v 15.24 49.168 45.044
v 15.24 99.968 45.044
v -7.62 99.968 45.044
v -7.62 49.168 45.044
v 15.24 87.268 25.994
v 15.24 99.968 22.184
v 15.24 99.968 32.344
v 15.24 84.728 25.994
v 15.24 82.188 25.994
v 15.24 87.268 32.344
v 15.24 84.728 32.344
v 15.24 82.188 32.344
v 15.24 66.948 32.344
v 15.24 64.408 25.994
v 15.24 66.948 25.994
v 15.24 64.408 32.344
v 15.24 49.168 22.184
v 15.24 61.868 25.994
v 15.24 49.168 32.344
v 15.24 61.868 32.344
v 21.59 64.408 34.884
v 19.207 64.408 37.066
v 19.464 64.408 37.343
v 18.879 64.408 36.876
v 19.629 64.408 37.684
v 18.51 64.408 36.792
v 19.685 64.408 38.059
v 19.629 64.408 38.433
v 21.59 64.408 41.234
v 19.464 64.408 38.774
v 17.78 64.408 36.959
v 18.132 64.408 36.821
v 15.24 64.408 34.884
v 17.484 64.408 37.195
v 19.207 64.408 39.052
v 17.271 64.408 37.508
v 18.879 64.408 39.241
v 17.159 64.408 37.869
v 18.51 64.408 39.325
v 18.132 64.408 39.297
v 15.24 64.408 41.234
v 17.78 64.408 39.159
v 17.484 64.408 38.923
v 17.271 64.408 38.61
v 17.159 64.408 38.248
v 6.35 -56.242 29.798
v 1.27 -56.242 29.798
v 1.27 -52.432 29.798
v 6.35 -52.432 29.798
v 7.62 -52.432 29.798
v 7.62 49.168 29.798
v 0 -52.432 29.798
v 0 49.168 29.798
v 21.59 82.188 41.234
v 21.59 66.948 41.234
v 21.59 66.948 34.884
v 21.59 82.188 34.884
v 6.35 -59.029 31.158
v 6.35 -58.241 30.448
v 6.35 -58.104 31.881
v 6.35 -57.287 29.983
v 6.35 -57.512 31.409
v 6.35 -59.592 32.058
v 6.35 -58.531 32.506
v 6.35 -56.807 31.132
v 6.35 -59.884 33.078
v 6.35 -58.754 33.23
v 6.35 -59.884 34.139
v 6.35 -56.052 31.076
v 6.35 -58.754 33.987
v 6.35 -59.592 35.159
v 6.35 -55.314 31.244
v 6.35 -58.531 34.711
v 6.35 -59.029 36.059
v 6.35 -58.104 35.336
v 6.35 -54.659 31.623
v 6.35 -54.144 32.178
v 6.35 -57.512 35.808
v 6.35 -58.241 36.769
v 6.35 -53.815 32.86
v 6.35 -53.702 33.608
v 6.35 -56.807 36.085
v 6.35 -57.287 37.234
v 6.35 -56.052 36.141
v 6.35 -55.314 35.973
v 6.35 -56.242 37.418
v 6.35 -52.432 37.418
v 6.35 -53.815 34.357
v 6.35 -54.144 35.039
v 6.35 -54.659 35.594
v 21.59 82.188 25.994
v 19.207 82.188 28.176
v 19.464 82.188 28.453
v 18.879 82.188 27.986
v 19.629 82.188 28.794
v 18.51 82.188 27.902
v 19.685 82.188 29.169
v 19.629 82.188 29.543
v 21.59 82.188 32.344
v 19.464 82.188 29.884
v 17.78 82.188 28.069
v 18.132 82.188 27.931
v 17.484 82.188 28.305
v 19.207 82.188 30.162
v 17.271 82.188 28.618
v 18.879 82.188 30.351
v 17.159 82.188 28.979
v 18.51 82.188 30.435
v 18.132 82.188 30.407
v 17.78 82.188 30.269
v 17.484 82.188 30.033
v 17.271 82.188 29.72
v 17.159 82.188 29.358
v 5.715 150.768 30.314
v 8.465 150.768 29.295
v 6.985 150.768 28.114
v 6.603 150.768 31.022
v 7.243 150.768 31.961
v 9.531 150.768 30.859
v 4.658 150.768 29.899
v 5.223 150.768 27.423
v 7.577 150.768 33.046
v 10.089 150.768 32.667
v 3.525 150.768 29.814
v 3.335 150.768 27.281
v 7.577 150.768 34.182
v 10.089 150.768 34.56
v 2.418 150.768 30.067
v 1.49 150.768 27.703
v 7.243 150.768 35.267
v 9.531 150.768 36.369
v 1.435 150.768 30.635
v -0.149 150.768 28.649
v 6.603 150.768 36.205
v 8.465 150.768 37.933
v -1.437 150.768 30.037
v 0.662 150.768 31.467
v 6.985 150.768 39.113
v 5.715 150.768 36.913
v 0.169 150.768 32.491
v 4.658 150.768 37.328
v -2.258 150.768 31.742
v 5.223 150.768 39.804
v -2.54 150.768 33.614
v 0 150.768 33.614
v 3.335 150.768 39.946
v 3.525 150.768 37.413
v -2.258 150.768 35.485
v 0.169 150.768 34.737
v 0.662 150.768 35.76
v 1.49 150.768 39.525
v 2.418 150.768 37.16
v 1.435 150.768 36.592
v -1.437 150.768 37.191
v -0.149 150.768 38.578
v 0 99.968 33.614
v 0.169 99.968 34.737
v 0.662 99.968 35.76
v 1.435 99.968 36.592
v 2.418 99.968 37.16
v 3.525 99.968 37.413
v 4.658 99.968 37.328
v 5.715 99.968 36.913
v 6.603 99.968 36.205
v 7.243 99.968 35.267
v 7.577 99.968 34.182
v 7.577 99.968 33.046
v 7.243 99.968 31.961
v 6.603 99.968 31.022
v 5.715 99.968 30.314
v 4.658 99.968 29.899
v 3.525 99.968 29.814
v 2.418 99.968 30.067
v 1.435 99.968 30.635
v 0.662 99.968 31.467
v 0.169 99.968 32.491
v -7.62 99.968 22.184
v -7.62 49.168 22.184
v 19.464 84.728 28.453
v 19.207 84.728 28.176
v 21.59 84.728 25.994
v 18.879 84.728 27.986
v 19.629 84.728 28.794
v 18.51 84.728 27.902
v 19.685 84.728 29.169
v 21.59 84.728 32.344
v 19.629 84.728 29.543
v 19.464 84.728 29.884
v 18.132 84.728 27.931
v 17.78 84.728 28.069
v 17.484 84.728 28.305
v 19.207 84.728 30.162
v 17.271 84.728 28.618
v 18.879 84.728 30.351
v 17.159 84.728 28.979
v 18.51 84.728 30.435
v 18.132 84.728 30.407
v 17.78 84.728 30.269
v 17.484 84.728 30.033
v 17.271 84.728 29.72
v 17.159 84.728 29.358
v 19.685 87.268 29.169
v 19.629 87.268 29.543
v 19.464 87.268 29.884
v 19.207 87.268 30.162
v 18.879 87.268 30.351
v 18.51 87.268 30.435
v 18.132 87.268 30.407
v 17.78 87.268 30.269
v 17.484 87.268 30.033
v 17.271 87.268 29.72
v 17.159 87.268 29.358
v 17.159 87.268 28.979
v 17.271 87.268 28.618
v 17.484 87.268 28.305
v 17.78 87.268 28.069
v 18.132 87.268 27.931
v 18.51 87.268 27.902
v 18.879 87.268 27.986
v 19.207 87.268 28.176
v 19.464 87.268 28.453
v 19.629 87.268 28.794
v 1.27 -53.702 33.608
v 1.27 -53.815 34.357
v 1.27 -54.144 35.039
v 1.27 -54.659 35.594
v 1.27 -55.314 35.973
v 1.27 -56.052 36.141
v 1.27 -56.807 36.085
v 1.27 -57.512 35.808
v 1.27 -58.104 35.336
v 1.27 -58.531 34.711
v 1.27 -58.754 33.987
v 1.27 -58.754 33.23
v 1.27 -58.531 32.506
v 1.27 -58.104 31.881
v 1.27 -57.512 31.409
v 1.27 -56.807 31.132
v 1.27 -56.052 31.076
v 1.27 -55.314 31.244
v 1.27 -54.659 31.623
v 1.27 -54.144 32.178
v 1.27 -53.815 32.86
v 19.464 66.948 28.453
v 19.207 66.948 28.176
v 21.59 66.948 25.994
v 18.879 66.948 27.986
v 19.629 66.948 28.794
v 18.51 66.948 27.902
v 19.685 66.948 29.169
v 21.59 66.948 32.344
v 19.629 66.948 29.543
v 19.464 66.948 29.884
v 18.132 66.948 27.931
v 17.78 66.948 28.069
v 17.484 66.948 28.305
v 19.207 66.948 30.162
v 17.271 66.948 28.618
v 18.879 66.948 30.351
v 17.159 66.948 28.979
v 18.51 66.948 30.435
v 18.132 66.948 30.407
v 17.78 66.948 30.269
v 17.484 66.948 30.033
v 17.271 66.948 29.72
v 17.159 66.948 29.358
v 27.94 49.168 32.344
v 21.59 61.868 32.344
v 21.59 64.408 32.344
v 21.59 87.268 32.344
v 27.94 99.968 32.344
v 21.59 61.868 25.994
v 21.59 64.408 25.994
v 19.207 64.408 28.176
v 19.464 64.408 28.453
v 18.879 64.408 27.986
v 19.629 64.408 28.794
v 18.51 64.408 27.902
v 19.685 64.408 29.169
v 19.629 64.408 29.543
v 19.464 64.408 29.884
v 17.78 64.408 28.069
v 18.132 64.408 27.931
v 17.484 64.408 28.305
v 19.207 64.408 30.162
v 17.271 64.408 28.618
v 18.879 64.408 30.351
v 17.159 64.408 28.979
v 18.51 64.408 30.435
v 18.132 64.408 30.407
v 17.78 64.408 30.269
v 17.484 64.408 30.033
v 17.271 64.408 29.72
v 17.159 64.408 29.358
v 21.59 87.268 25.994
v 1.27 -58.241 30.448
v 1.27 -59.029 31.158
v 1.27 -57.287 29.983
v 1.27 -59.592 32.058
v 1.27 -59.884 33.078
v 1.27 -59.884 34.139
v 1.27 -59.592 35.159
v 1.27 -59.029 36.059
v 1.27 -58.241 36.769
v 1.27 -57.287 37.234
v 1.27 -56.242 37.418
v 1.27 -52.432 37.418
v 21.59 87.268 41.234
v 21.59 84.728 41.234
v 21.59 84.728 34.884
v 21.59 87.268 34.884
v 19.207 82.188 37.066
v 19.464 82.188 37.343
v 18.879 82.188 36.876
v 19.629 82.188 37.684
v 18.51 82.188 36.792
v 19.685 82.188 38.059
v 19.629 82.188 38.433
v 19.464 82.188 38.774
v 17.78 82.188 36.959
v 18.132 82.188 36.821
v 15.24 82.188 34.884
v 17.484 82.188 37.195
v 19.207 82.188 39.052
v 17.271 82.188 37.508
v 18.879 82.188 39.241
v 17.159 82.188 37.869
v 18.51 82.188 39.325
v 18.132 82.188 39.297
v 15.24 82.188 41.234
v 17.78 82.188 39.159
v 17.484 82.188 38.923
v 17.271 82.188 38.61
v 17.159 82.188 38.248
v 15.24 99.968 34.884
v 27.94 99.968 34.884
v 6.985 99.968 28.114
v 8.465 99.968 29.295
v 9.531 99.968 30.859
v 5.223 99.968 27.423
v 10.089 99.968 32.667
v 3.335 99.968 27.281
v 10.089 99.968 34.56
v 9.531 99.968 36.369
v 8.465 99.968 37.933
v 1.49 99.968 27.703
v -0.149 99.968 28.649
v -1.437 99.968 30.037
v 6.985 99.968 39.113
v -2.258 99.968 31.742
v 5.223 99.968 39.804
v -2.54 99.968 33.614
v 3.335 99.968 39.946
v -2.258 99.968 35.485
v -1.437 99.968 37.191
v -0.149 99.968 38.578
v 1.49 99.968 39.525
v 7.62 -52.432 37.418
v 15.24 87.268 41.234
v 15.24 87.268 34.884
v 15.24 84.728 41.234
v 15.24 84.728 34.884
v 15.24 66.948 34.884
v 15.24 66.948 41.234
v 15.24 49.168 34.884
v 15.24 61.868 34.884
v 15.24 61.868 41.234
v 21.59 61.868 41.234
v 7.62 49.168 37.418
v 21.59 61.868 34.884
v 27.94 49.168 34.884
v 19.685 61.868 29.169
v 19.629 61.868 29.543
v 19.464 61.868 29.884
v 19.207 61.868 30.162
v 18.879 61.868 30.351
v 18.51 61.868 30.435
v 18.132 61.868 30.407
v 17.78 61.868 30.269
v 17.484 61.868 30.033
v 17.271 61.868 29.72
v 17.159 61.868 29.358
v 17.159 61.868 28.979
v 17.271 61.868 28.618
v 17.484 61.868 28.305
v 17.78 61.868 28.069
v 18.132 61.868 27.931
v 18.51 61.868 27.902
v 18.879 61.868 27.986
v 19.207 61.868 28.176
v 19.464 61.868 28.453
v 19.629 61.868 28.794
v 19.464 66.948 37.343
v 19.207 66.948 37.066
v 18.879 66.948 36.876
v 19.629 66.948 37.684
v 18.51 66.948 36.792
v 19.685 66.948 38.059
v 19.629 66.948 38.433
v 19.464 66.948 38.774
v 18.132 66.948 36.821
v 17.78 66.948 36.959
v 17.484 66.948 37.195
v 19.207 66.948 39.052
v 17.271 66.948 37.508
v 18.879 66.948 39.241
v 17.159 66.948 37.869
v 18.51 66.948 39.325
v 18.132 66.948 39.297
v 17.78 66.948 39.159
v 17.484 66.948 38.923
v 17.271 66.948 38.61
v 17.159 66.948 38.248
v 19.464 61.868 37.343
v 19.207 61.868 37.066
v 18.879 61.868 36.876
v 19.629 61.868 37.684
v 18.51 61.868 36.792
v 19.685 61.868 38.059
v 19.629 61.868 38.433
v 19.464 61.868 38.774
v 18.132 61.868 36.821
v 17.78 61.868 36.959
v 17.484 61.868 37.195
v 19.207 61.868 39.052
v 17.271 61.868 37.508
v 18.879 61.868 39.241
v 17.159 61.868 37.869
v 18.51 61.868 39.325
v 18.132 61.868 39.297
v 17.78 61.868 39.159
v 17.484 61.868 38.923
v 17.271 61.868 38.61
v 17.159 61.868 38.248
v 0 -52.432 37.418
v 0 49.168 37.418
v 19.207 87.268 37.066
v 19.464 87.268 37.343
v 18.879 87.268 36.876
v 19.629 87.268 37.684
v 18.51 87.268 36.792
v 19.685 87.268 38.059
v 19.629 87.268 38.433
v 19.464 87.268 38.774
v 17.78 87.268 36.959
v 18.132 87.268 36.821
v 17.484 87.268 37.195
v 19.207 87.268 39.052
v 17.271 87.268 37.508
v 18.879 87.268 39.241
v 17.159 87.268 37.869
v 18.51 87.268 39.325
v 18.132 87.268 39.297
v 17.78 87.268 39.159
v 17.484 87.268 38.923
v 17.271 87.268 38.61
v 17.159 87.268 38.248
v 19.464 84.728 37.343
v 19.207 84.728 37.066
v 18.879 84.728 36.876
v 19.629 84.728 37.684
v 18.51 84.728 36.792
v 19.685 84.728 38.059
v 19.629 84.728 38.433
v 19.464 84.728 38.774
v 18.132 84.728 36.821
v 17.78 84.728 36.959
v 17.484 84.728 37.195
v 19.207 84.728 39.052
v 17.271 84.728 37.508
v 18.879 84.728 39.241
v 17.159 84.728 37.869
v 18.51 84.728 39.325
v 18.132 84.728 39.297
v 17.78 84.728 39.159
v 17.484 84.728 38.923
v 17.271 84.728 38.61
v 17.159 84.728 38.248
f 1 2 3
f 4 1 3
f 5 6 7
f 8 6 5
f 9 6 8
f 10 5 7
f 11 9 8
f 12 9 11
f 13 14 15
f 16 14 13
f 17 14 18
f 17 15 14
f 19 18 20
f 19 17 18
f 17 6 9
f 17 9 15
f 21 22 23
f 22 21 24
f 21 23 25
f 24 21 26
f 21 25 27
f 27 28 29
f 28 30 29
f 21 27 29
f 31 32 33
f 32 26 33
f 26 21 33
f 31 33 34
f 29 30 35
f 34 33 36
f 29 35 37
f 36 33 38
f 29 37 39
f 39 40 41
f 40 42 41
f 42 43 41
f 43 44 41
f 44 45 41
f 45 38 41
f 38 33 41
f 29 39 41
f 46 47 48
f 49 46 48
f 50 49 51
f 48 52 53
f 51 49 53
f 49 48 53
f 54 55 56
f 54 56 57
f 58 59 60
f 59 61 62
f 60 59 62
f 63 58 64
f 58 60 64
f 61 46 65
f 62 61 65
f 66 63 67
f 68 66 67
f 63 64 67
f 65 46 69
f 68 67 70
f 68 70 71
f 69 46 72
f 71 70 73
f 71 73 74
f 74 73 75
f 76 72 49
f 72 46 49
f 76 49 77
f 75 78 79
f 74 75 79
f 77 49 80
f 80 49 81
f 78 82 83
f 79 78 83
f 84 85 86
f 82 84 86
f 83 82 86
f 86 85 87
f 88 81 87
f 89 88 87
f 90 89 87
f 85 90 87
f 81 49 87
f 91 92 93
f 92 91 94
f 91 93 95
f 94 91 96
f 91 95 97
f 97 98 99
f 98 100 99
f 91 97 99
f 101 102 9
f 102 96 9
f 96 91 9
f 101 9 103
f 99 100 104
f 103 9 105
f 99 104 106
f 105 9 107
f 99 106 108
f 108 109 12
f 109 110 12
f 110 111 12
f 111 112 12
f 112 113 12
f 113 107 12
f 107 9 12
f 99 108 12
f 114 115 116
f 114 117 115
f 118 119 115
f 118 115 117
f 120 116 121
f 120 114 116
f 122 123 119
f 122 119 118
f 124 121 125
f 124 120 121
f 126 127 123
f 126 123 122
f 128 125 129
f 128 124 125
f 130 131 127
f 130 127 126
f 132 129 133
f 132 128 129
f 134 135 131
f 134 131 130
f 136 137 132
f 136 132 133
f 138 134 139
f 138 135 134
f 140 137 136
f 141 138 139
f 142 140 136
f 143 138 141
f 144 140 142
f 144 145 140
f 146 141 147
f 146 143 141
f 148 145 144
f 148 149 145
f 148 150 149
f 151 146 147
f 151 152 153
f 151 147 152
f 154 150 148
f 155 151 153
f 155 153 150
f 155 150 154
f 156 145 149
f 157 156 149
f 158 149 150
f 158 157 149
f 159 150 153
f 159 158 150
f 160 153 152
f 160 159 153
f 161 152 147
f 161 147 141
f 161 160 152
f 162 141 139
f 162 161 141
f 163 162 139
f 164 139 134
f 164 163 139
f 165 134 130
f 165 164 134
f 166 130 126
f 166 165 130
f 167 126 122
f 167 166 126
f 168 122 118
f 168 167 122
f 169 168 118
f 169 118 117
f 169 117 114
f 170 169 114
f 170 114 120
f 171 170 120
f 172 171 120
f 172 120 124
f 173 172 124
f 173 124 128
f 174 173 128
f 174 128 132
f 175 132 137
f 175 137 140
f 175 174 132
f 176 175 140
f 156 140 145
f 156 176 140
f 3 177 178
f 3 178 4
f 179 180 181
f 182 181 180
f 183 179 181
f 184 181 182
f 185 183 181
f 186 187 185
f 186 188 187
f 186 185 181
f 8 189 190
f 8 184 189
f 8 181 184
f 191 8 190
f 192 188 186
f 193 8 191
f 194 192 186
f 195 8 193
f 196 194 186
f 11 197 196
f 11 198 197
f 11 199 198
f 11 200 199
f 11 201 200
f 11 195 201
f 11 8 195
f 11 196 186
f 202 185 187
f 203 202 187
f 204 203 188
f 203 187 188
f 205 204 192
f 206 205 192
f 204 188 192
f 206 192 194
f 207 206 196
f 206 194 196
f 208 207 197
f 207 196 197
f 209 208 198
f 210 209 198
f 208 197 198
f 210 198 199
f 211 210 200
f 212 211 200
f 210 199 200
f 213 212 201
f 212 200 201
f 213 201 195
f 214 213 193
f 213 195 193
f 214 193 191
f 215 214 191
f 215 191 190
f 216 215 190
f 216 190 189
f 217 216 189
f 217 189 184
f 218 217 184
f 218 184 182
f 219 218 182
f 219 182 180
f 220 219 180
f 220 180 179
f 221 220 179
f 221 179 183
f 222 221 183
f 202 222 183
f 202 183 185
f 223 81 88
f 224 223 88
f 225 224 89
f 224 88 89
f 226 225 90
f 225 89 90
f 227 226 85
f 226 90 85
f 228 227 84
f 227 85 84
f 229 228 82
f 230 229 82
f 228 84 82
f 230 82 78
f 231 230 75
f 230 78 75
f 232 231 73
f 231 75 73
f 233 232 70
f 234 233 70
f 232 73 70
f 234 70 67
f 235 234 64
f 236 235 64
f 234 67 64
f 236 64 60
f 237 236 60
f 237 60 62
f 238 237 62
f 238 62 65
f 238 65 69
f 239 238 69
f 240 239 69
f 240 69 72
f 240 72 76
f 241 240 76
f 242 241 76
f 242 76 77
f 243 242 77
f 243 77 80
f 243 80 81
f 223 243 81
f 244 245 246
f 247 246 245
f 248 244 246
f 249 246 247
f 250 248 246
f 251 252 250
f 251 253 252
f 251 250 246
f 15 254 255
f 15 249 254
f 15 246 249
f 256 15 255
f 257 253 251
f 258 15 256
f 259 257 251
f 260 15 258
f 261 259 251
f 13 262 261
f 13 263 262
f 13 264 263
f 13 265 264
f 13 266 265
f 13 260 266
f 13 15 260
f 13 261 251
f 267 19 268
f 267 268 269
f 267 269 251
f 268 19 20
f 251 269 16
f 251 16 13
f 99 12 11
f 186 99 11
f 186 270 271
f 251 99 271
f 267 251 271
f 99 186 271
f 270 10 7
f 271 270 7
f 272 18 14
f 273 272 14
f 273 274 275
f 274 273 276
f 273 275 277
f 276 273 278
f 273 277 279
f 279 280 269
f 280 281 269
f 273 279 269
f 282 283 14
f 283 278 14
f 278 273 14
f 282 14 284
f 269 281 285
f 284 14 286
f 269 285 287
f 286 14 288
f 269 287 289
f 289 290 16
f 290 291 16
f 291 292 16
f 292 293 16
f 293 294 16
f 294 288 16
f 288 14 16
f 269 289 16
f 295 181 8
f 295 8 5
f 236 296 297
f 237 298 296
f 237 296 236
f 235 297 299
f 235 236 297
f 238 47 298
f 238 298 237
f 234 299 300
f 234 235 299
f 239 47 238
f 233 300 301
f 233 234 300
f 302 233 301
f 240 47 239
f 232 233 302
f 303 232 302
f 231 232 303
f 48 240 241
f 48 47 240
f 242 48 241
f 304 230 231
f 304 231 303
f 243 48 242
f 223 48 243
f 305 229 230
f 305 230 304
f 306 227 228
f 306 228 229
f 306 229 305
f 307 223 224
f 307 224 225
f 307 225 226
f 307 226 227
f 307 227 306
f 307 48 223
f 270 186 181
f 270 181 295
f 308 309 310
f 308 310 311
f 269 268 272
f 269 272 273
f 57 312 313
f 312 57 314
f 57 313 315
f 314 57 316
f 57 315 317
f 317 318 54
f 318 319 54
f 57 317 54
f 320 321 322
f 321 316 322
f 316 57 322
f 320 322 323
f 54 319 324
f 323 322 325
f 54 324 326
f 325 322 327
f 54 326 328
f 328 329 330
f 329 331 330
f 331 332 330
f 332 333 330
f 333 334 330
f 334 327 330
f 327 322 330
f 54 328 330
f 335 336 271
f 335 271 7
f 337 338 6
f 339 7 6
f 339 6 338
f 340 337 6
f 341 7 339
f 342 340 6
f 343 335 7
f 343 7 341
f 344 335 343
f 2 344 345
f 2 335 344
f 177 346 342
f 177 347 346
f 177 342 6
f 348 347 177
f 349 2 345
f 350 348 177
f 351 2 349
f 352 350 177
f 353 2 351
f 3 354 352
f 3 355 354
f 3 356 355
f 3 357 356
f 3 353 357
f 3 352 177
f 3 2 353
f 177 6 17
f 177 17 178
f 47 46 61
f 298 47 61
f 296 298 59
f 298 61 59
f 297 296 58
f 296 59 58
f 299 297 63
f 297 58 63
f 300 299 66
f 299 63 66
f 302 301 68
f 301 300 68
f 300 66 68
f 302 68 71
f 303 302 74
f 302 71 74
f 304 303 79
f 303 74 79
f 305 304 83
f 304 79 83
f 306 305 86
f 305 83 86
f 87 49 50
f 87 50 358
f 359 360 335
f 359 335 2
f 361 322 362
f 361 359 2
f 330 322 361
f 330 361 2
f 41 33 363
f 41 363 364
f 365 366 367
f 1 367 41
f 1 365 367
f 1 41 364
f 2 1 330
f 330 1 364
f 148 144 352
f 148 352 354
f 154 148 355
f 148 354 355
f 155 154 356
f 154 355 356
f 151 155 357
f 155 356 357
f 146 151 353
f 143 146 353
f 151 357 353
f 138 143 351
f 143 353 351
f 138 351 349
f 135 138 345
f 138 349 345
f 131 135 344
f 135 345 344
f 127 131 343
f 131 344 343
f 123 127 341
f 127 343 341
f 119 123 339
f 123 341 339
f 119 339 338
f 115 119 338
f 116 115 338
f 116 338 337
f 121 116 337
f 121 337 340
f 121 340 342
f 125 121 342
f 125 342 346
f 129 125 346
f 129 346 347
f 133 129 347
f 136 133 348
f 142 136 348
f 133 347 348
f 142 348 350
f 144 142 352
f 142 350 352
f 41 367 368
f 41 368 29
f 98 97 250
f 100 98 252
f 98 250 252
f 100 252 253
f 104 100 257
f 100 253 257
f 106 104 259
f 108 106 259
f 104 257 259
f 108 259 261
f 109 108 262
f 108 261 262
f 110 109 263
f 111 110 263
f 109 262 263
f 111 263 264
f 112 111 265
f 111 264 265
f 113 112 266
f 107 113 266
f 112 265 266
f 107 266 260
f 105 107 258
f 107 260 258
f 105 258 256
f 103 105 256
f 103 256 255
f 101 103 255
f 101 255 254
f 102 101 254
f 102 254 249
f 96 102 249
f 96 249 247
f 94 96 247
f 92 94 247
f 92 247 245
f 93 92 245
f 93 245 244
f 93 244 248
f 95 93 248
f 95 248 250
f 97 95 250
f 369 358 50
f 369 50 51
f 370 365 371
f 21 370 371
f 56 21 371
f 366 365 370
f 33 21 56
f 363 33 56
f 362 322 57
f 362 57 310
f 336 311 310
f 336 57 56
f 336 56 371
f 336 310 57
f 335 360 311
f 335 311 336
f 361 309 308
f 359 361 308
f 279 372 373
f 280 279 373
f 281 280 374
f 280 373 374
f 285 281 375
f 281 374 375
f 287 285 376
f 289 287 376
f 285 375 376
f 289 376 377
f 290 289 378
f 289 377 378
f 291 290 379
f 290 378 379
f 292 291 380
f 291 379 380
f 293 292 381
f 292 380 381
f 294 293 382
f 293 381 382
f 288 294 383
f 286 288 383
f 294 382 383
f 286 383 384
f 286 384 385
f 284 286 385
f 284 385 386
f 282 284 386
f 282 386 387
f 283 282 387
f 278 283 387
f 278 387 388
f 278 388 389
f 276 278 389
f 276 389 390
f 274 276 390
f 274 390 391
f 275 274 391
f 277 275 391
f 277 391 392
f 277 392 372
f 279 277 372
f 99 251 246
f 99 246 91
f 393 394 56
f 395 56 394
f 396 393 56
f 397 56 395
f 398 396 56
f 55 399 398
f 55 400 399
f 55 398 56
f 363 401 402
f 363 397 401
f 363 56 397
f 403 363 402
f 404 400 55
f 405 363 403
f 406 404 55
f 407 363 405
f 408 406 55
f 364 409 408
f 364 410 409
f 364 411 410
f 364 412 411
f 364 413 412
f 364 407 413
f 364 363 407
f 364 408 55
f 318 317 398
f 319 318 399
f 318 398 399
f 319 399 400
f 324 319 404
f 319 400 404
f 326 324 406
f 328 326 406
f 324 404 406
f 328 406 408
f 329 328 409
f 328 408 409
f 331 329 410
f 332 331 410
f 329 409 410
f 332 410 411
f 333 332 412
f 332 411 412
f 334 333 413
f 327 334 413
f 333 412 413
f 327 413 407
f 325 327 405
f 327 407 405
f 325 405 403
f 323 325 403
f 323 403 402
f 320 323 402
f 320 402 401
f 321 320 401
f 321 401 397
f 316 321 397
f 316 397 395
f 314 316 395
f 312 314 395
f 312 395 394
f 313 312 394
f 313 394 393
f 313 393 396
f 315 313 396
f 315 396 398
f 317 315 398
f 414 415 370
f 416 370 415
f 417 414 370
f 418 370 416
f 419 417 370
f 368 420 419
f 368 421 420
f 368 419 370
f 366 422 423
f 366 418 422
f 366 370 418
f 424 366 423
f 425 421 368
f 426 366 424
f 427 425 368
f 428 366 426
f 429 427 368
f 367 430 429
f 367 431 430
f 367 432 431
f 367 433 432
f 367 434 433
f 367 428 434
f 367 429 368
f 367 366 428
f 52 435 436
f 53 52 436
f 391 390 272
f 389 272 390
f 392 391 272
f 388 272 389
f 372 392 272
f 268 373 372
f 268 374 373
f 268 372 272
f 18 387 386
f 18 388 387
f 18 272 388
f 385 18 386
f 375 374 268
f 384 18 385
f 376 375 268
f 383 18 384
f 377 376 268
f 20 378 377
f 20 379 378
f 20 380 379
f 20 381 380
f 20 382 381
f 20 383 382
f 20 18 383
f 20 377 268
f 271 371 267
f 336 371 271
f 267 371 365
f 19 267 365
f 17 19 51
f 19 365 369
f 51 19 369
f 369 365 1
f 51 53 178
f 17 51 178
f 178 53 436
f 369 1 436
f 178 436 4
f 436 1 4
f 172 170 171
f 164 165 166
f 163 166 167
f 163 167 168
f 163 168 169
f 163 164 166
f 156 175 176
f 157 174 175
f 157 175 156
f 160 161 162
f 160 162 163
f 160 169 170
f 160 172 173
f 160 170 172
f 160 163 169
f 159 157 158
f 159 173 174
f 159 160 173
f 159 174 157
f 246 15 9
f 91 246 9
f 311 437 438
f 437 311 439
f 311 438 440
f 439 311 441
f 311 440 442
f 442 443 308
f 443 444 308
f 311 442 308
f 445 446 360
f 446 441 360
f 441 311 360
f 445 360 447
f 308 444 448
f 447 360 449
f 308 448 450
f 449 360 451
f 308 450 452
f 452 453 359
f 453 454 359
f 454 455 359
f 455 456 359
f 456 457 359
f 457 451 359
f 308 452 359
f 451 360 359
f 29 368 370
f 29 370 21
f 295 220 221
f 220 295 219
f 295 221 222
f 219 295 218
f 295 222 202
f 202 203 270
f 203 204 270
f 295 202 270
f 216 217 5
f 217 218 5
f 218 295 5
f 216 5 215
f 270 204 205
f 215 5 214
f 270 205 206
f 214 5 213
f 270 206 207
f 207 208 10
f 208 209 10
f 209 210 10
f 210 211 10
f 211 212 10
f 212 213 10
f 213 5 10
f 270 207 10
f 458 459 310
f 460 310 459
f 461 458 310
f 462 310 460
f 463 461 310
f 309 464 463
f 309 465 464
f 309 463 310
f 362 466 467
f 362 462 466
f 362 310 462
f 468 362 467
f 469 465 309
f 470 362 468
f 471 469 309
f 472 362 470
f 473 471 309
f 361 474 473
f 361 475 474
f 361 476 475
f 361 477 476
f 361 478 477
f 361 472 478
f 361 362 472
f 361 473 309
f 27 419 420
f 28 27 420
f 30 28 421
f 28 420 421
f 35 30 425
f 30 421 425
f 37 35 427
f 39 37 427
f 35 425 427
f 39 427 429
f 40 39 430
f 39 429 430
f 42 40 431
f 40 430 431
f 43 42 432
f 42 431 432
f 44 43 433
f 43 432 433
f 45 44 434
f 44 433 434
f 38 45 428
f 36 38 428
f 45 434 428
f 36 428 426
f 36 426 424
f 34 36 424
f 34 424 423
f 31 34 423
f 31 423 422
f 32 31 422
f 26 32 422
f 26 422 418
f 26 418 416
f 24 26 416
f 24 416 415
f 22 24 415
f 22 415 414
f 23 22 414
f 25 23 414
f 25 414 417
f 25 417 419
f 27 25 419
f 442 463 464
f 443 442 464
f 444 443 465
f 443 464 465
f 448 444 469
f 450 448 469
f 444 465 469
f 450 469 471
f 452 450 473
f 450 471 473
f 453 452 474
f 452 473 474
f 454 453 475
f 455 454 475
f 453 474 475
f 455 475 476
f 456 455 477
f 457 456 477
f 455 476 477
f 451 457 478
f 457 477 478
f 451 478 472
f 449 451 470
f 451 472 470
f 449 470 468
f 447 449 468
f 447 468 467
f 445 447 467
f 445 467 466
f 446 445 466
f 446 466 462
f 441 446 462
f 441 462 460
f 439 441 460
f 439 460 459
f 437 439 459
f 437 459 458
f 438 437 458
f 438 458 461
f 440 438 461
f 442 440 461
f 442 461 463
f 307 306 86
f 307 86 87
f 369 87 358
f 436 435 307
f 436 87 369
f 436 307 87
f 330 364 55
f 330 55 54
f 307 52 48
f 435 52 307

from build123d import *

# Parameters (mm, degrees)
F0_W      = 101.6
F0_H      = 7.62
F1_DEPTH  = 7.62
F2_W      = 5.08
F2_H      = 7.62
F3_DEPTH  = 7.62
F4_R      = 2.54
F5_DEPTH  = 25.4
F6_W      = 22.86
F6_H      = 22.86
F6_W_2    = 7.62
F6_H_2    = 7.62
F7_DEPTH  = 50.8
F8_R      = 6.35
F8_R_2    = 3.81
F9_DEPTH  = 50.8
F10_W     = 50.8
F10_H     = 2.54
F11_DEPTH = 12.7
F12_W     = 2.54
F12_H     = 6.35
F12_W_2   = 15.24
F13_DEPTH = 6.35
F14_W     = 2.54
F14_H     = 6.35
F14_W_2   = 15.24
F15_DEPTH = 6.35
F16_R     = 1.27
F17_DEPTH = 25.4
F18_R     = 1.27
F19_DEPTH = 25.4


with BuildPart() as f1:
    # F0 (on Right) → F1 (new body)
    with BuildSketch(Plane.YZ):
        with Locations((-1.6321643911, 33.6084578316)):
            Rectangle(F0_W, F0_H)
    extrude(amount=F1_DEPTH)

    # F2 (on face) → F3 (join)
    with BuildSketch(Plane.XZ.offset(52.4321643911)):
        with Locations((3.81, 33.6084578316)):
            Rectangle(F2_W, F2_H)
    extrude(amount=F3_DEPTH)

    # F4 (on face) → F5 (cut)
    with BuildSketch(Plane.YZ.offset(6.35)):
        with Locations((-56.2421643911, 33.6084578316)):
            Circle(F4_R)
        with BuildLine():
            ThreePointArc((-56.2421643911, 29.7984578316), (-59.9211503168, 33.6084578316), (-56.2421643911, 37.4184578316))
            Line((-56.2421643911, 37.4184578316), (-60.0521643911, 37.4184578316))
            Line((-60.0521643911, 37.4184578316), (-60.0521643911, 29.7984578316))
            Line((-60.0521643911, 29.7984578316), (-56.2421643911, 29.7984578316))
        make_face()
    extrude(amount=-F5_DEPTH, mode=Mode.SUBTRACT)

    # F6 (on face) → F7 (join)
    with BuildSketch(Plane(origin=(0, 49.1678356089, 0), x_dir=(-1, 0, 0), z_dir=(0, 1, 0))):
        with Locations((-3.81, 33.6136929691)):
            Rectangle(F6_W, F6_H)
        with Locations((-3.81, 33.6084578316)):
            Rectangle(F6_W_2, F6_H_2, mode=Mode.SUBTRACT)
        with Locations((-3.81, 33.6084578316)):
            Rectangle(F6_W_2, F6_H_2)
    extrude(amount=F7_DEPTH)

    # F8 (on face) → F9 (join)
    with BuildSketch(Plane(origin=(0, 99.9678356089, 0), x_dir=(-1, 0, 0), z_dir=(0, 1, 0))):
        with Locations((-3.81, 33.6136929691)):
            Circle(F8_R)
        with Locations((-3.81, 33.6136929691)):
            Circle(F8_R_2, mode=Mode.SUBTRACT)
    extrude(amount=F9_DEPTH)

    # F10 (on face) → F11 (join)
    with BuildSketch(Plane.YZ.offset(15.24)):
        with Locations((74.5678356089, 33.6136929691)):
            Rectangle(F10_W, F10_H)
    extrude(amount=F11_DEPTH)

    # F12 (on face) → F13 (join)
    with BuildSketch(Plane.YZ.offset(15.24)):
        with Locations((63.1378356089, 38.0586929691)):
            Rectangle(F12_W, F12_H)
        with Locations((74.5678356089, 38.0586929691)):
            Rectangle(F12_W_2, F12_H)
        with Locations((85.9978356089, 38.0586929691)):
            Rectangle(F12_W, F12_H)
    extrude(amount=F13_DEPTH)

    # F14 (on face) → F15 (join)
    with BuildSketch(Plane.YZ.offset(15.24)):
        with Locations((63.1378356089, 29.1686929691)):
            Rectangle(F14_W, F14_H)
        with Locations((74.5678356089, 29.1686929691)):
            Rectangle(F14_W_2, F14_H)
        with Locations((85.9978356089, 29.1686929691)):
            Rectangle(F14_W, F14_H)
    extrude(amount=F15_DEPTH)

    # F16 (on face) → F17 (cut)
    with BuildSketch(Plane.XZ.offset(-61.8678356089)):
        with Locations((18.415, 38.0586929691)):
            Circle(F16_R)
    extrude(amount=-F17_DEPTH, mode=Mode.SUBTRACT)

    # F18 (on face) → F19 (cut)
    with BuildSketch(Plane.XZ.offset(-61.8678356089)):
        with Locations((18.415, 29.1686929691)):
            Circle(F18_R)
    extrude(amount=-F19_DEPTH, mode=Mode.SUBTRACT)


solid = f1.part
